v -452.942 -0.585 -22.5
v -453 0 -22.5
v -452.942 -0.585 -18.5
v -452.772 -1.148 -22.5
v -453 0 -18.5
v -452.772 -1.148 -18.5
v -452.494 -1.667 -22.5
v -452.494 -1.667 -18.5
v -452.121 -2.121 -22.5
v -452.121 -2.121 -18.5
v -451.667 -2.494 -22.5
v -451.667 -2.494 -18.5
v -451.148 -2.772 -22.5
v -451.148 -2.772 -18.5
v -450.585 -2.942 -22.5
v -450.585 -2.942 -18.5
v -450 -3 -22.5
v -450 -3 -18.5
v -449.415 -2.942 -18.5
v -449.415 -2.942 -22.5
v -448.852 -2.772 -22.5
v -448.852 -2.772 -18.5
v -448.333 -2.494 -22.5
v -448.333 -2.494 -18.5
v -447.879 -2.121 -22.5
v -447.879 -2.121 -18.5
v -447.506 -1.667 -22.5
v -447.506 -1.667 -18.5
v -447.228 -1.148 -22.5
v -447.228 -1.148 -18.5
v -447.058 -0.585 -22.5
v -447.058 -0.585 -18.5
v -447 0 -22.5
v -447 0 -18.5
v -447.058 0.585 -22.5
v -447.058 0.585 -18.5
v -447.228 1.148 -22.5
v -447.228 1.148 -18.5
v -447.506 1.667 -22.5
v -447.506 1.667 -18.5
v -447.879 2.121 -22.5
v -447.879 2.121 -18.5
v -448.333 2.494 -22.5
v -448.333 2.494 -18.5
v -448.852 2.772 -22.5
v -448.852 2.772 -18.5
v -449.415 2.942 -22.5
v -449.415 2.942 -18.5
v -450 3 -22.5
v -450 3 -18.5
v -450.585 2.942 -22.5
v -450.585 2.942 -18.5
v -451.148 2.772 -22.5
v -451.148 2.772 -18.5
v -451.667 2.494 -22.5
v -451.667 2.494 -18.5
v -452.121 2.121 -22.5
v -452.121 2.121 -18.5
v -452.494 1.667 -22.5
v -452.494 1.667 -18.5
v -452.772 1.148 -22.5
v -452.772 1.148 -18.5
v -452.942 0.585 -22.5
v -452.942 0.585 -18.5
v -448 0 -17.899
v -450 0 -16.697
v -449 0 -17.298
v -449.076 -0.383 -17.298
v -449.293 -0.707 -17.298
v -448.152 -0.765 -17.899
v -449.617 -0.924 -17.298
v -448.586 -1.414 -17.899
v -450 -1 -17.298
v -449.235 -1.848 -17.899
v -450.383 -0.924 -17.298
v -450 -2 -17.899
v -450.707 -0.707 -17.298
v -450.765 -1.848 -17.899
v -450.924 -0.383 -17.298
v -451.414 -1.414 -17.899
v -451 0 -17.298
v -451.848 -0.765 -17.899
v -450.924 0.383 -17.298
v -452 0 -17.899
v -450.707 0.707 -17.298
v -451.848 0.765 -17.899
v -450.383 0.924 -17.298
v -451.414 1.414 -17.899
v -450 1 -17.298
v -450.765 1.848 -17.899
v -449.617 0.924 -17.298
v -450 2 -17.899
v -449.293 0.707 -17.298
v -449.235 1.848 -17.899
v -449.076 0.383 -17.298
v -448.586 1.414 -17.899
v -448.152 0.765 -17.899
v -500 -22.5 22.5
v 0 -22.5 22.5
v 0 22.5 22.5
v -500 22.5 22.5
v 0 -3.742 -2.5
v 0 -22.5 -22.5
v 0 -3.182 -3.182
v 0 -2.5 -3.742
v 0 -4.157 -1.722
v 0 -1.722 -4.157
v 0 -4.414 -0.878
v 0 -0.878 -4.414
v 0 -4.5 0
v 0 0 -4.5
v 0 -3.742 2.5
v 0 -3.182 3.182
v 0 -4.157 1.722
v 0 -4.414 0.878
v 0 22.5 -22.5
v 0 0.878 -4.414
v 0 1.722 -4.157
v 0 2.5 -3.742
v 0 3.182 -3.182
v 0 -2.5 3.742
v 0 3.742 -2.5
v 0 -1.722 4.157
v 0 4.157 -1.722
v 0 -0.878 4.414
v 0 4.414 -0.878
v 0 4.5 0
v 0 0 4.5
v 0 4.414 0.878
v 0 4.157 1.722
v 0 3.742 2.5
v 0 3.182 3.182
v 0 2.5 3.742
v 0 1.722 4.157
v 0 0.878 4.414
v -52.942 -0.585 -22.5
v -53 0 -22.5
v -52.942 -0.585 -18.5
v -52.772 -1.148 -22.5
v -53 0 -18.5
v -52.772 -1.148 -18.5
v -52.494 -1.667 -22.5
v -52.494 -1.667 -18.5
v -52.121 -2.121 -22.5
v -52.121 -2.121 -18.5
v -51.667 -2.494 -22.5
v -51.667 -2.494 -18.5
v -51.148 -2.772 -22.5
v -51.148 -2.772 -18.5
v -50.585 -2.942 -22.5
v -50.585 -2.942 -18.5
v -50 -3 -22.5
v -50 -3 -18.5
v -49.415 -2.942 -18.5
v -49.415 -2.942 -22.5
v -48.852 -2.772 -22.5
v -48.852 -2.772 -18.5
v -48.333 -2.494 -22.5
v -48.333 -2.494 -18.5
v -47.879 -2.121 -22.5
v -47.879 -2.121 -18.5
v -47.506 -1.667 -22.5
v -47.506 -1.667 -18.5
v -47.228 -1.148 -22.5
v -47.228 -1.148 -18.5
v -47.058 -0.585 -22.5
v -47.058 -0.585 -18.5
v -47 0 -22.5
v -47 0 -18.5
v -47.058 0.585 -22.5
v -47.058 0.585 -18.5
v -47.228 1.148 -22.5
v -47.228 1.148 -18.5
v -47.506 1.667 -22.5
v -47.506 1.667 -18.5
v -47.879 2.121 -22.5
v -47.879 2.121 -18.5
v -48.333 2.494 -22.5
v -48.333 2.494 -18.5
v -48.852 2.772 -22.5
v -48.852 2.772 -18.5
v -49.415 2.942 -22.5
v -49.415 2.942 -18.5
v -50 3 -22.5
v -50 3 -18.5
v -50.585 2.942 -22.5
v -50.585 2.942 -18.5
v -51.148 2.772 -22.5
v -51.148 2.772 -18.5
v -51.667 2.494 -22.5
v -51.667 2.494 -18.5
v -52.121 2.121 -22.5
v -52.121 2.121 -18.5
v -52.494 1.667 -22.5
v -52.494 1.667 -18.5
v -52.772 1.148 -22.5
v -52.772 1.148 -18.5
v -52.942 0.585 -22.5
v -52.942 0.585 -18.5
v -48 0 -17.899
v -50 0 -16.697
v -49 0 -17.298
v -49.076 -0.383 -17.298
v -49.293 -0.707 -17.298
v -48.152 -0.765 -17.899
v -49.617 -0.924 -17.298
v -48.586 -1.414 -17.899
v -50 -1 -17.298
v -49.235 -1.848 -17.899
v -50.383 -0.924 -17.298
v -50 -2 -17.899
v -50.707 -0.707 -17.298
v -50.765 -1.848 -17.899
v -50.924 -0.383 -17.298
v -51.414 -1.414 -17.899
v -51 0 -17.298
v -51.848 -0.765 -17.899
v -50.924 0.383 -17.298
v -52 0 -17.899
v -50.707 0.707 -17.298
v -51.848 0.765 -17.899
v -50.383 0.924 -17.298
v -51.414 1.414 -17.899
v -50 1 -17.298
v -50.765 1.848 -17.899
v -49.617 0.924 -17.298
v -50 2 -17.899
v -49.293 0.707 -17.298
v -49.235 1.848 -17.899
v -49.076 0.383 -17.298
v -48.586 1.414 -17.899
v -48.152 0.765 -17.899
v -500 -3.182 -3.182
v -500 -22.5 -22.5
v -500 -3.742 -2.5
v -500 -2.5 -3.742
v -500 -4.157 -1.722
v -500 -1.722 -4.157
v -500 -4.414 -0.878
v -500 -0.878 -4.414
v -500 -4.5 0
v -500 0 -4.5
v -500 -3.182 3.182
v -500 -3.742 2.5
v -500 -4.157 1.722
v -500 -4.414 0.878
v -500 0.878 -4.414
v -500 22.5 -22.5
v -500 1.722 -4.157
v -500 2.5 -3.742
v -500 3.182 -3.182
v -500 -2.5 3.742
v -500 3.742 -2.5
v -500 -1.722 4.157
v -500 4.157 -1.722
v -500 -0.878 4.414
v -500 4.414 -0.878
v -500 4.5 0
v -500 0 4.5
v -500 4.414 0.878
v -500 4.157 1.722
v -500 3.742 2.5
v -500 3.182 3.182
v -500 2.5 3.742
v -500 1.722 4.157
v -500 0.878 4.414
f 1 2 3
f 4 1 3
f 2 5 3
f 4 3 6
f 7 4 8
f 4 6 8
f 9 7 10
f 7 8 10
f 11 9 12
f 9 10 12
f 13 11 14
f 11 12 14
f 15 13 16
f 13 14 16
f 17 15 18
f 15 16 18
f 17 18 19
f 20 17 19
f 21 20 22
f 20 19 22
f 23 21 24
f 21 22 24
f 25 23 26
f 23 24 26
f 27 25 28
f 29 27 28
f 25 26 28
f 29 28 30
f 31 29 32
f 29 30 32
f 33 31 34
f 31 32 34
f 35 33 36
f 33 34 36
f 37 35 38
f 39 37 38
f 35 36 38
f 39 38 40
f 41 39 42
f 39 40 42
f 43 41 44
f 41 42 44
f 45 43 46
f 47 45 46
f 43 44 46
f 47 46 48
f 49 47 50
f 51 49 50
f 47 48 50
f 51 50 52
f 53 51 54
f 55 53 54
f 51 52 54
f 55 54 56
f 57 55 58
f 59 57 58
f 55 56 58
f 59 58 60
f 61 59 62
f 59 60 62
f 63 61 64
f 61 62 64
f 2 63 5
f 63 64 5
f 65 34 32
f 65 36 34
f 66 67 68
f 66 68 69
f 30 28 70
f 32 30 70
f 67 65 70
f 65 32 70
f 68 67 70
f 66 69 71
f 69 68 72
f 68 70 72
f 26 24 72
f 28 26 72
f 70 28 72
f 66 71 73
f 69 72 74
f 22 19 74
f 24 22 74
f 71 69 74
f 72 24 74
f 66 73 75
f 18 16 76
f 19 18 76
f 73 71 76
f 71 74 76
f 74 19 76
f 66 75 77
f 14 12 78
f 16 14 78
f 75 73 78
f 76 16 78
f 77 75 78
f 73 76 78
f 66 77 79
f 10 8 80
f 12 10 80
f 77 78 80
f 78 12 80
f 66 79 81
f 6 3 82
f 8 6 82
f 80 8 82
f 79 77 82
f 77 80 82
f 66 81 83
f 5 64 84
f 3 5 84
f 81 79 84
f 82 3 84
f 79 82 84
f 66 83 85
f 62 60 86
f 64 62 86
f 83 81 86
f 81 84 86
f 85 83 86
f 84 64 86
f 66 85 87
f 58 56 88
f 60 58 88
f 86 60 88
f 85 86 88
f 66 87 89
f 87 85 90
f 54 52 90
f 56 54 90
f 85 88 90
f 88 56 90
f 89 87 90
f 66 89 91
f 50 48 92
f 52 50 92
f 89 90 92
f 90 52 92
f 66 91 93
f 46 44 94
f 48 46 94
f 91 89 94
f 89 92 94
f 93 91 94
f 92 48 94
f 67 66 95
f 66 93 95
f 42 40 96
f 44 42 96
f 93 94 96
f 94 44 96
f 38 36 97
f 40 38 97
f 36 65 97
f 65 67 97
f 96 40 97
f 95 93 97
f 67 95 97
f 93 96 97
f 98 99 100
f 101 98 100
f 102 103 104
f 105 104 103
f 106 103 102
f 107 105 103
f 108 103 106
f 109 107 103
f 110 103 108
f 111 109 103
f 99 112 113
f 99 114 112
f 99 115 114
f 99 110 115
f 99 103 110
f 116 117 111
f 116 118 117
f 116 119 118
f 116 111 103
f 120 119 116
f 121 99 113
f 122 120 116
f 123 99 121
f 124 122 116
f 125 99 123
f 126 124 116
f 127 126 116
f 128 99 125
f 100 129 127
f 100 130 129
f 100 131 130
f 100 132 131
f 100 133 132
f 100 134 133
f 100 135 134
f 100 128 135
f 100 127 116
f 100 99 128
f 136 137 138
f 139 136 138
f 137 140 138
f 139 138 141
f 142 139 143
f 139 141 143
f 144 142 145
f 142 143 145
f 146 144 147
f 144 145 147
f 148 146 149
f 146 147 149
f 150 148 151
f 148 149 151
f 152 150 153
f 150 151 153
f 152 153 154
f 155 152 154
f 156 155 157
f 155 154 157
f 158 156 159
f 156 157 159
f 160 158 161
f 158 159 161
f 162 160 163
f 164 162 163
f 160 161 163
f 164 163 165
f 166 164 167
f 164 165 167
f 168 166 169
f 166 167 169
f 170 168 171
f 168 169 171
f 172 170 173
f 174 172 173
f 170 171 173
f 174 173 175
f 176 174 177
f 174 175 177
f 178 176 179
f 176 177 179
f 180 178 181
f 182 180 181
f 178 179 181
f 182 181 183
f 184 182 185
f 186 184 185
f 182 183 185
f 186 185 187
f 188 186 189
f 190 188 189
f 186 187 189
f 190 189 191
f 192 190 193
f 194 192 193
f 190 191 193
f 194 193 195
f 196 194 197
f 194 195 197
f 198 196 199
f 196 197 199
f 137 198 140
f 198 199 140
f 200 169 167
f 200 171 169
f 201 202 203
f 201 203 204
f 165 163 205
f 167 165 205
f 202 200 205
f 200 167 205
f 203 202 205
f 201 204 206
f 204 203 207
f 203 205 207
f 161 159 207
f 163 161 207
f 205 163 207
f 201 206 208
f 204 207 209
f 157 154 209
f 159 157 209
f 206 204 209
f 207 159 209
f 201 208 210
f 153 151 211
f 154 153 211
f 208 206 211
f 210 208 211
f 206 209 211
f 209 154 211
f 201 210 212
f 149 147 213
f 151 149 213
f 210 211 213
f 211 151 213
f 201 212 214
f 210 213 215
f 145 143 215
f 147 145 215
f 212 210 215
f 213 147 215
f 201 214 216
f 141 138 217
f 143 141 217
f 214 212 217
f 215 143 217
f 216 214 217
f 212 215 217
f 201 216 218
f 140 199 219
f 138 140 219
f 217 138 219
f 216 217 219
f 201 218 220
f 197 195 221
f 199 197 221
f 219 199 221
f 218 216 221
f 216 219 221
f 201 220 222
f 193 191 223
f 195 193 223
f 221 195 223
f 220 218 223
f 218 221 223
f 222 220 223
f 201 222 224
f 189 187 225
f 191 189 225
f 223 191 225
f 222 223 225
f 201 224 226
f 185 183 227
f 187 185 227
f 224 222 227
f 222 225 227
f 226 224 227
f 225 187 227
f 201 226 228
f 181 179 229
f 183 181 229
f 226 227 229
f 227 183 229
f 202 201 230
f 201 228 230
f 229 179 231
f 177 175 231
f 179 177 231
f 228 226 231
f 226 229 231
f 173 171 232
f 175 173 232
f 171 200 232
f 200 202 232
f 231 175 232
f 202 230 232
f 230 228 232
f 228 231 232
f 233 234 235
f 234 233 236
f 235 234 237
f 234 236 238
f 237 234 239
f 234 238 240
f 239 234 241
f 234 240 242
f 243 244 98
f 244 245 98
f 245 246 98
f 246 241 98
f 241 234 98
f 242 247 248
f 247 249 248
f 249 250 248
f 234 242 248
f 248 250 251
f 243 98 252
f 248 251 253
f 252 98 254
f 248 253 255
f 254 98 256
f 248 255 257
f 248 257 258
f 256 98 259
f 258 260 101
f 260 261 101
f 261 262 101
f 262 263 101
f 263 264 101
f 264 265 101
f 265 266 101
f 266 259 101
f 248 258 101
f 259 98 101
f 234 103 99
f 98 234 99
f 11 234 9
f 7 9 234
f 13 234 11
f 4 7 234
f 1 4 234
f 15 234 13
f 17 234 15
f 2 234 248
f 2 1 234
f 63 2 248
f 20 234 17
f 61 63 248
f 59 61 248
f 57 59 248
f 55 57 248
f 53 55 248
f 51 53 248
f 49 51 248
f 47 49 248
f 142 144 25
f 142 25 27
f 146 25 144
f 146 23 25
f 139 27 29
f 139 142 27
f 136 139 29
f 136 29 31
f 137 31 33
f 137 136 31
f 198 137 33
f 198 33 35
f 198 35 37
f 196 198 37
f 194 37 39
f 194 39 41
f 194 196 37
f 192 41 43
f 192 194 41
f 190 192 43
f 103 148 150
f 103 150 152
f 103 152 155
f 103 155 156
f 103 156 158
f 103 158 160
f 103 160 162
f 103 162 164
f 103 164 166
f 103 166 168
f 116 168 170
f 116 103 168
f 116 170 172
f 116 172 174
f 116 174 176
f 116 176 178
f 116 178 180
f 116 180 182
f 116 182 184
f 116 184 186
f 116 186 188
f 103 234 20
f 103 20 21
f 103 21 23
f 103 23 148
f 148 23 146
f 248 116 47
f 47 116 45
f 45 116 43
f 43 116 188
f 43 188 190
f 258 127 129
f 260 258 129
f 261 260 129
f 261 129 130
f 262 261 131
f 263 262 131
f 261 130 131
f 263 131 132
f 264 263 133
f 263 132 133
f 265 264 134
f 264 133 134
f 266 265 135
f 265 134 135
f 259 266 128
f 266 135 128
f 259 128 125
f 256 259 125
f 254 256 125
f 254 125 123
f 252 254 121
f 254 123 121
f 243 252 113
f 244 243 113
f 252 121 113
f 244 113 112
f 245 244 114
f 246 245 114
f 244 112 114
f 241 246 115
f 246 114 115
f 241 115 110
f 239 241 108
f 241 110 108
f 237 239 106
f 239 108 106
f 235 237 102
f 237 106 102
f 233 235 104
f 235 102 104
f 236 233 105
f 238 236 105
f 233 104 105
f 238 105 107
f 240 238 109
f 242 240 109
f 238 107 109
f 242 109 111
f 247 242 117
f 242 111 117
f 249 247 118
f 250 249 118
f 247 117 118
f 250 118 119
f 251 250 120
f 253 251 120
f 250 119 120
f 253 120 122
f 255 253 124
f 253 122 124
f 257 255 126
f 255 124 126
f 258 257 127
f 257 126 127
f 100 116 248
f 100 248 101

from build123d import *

# Parameters (mm, degrees)
F0_W     = 45
F0_H     = 45
F0_R     = 4.5
F1_DEPTH = 500
F3_D     = 6
F3_DEPTH = 4
F3_TIP   = 1.8025818571


with BuildPart() as f1:
    # F0 (on Right) → F1 (new body)
    with BuildSketch(Plane.YZ):
        Rectangle(F0_W, F0_H)
        Circle(F0_R, mode=Mode.SUBTRACT)
    extrude(amount=-F1_DEPTH)

    # F3
    with Locations(Plane(origin=(0, 0, -22.5), x_dir=(1, 0, 0), z_dir=(0, 0, -1))):
        with Locations((-50, 0), (-450, 0)):
            Hole(F3_D / 2, depth=F3_DEPTH)
            with Locations((0, 0, -(F3_DEPTH + F3_TIP / 2))):  # 118° drill point
                Cone(0, F3_D / 2, F3_TIP, mode=Mode.SUBTRACT)


solid = f1.part
